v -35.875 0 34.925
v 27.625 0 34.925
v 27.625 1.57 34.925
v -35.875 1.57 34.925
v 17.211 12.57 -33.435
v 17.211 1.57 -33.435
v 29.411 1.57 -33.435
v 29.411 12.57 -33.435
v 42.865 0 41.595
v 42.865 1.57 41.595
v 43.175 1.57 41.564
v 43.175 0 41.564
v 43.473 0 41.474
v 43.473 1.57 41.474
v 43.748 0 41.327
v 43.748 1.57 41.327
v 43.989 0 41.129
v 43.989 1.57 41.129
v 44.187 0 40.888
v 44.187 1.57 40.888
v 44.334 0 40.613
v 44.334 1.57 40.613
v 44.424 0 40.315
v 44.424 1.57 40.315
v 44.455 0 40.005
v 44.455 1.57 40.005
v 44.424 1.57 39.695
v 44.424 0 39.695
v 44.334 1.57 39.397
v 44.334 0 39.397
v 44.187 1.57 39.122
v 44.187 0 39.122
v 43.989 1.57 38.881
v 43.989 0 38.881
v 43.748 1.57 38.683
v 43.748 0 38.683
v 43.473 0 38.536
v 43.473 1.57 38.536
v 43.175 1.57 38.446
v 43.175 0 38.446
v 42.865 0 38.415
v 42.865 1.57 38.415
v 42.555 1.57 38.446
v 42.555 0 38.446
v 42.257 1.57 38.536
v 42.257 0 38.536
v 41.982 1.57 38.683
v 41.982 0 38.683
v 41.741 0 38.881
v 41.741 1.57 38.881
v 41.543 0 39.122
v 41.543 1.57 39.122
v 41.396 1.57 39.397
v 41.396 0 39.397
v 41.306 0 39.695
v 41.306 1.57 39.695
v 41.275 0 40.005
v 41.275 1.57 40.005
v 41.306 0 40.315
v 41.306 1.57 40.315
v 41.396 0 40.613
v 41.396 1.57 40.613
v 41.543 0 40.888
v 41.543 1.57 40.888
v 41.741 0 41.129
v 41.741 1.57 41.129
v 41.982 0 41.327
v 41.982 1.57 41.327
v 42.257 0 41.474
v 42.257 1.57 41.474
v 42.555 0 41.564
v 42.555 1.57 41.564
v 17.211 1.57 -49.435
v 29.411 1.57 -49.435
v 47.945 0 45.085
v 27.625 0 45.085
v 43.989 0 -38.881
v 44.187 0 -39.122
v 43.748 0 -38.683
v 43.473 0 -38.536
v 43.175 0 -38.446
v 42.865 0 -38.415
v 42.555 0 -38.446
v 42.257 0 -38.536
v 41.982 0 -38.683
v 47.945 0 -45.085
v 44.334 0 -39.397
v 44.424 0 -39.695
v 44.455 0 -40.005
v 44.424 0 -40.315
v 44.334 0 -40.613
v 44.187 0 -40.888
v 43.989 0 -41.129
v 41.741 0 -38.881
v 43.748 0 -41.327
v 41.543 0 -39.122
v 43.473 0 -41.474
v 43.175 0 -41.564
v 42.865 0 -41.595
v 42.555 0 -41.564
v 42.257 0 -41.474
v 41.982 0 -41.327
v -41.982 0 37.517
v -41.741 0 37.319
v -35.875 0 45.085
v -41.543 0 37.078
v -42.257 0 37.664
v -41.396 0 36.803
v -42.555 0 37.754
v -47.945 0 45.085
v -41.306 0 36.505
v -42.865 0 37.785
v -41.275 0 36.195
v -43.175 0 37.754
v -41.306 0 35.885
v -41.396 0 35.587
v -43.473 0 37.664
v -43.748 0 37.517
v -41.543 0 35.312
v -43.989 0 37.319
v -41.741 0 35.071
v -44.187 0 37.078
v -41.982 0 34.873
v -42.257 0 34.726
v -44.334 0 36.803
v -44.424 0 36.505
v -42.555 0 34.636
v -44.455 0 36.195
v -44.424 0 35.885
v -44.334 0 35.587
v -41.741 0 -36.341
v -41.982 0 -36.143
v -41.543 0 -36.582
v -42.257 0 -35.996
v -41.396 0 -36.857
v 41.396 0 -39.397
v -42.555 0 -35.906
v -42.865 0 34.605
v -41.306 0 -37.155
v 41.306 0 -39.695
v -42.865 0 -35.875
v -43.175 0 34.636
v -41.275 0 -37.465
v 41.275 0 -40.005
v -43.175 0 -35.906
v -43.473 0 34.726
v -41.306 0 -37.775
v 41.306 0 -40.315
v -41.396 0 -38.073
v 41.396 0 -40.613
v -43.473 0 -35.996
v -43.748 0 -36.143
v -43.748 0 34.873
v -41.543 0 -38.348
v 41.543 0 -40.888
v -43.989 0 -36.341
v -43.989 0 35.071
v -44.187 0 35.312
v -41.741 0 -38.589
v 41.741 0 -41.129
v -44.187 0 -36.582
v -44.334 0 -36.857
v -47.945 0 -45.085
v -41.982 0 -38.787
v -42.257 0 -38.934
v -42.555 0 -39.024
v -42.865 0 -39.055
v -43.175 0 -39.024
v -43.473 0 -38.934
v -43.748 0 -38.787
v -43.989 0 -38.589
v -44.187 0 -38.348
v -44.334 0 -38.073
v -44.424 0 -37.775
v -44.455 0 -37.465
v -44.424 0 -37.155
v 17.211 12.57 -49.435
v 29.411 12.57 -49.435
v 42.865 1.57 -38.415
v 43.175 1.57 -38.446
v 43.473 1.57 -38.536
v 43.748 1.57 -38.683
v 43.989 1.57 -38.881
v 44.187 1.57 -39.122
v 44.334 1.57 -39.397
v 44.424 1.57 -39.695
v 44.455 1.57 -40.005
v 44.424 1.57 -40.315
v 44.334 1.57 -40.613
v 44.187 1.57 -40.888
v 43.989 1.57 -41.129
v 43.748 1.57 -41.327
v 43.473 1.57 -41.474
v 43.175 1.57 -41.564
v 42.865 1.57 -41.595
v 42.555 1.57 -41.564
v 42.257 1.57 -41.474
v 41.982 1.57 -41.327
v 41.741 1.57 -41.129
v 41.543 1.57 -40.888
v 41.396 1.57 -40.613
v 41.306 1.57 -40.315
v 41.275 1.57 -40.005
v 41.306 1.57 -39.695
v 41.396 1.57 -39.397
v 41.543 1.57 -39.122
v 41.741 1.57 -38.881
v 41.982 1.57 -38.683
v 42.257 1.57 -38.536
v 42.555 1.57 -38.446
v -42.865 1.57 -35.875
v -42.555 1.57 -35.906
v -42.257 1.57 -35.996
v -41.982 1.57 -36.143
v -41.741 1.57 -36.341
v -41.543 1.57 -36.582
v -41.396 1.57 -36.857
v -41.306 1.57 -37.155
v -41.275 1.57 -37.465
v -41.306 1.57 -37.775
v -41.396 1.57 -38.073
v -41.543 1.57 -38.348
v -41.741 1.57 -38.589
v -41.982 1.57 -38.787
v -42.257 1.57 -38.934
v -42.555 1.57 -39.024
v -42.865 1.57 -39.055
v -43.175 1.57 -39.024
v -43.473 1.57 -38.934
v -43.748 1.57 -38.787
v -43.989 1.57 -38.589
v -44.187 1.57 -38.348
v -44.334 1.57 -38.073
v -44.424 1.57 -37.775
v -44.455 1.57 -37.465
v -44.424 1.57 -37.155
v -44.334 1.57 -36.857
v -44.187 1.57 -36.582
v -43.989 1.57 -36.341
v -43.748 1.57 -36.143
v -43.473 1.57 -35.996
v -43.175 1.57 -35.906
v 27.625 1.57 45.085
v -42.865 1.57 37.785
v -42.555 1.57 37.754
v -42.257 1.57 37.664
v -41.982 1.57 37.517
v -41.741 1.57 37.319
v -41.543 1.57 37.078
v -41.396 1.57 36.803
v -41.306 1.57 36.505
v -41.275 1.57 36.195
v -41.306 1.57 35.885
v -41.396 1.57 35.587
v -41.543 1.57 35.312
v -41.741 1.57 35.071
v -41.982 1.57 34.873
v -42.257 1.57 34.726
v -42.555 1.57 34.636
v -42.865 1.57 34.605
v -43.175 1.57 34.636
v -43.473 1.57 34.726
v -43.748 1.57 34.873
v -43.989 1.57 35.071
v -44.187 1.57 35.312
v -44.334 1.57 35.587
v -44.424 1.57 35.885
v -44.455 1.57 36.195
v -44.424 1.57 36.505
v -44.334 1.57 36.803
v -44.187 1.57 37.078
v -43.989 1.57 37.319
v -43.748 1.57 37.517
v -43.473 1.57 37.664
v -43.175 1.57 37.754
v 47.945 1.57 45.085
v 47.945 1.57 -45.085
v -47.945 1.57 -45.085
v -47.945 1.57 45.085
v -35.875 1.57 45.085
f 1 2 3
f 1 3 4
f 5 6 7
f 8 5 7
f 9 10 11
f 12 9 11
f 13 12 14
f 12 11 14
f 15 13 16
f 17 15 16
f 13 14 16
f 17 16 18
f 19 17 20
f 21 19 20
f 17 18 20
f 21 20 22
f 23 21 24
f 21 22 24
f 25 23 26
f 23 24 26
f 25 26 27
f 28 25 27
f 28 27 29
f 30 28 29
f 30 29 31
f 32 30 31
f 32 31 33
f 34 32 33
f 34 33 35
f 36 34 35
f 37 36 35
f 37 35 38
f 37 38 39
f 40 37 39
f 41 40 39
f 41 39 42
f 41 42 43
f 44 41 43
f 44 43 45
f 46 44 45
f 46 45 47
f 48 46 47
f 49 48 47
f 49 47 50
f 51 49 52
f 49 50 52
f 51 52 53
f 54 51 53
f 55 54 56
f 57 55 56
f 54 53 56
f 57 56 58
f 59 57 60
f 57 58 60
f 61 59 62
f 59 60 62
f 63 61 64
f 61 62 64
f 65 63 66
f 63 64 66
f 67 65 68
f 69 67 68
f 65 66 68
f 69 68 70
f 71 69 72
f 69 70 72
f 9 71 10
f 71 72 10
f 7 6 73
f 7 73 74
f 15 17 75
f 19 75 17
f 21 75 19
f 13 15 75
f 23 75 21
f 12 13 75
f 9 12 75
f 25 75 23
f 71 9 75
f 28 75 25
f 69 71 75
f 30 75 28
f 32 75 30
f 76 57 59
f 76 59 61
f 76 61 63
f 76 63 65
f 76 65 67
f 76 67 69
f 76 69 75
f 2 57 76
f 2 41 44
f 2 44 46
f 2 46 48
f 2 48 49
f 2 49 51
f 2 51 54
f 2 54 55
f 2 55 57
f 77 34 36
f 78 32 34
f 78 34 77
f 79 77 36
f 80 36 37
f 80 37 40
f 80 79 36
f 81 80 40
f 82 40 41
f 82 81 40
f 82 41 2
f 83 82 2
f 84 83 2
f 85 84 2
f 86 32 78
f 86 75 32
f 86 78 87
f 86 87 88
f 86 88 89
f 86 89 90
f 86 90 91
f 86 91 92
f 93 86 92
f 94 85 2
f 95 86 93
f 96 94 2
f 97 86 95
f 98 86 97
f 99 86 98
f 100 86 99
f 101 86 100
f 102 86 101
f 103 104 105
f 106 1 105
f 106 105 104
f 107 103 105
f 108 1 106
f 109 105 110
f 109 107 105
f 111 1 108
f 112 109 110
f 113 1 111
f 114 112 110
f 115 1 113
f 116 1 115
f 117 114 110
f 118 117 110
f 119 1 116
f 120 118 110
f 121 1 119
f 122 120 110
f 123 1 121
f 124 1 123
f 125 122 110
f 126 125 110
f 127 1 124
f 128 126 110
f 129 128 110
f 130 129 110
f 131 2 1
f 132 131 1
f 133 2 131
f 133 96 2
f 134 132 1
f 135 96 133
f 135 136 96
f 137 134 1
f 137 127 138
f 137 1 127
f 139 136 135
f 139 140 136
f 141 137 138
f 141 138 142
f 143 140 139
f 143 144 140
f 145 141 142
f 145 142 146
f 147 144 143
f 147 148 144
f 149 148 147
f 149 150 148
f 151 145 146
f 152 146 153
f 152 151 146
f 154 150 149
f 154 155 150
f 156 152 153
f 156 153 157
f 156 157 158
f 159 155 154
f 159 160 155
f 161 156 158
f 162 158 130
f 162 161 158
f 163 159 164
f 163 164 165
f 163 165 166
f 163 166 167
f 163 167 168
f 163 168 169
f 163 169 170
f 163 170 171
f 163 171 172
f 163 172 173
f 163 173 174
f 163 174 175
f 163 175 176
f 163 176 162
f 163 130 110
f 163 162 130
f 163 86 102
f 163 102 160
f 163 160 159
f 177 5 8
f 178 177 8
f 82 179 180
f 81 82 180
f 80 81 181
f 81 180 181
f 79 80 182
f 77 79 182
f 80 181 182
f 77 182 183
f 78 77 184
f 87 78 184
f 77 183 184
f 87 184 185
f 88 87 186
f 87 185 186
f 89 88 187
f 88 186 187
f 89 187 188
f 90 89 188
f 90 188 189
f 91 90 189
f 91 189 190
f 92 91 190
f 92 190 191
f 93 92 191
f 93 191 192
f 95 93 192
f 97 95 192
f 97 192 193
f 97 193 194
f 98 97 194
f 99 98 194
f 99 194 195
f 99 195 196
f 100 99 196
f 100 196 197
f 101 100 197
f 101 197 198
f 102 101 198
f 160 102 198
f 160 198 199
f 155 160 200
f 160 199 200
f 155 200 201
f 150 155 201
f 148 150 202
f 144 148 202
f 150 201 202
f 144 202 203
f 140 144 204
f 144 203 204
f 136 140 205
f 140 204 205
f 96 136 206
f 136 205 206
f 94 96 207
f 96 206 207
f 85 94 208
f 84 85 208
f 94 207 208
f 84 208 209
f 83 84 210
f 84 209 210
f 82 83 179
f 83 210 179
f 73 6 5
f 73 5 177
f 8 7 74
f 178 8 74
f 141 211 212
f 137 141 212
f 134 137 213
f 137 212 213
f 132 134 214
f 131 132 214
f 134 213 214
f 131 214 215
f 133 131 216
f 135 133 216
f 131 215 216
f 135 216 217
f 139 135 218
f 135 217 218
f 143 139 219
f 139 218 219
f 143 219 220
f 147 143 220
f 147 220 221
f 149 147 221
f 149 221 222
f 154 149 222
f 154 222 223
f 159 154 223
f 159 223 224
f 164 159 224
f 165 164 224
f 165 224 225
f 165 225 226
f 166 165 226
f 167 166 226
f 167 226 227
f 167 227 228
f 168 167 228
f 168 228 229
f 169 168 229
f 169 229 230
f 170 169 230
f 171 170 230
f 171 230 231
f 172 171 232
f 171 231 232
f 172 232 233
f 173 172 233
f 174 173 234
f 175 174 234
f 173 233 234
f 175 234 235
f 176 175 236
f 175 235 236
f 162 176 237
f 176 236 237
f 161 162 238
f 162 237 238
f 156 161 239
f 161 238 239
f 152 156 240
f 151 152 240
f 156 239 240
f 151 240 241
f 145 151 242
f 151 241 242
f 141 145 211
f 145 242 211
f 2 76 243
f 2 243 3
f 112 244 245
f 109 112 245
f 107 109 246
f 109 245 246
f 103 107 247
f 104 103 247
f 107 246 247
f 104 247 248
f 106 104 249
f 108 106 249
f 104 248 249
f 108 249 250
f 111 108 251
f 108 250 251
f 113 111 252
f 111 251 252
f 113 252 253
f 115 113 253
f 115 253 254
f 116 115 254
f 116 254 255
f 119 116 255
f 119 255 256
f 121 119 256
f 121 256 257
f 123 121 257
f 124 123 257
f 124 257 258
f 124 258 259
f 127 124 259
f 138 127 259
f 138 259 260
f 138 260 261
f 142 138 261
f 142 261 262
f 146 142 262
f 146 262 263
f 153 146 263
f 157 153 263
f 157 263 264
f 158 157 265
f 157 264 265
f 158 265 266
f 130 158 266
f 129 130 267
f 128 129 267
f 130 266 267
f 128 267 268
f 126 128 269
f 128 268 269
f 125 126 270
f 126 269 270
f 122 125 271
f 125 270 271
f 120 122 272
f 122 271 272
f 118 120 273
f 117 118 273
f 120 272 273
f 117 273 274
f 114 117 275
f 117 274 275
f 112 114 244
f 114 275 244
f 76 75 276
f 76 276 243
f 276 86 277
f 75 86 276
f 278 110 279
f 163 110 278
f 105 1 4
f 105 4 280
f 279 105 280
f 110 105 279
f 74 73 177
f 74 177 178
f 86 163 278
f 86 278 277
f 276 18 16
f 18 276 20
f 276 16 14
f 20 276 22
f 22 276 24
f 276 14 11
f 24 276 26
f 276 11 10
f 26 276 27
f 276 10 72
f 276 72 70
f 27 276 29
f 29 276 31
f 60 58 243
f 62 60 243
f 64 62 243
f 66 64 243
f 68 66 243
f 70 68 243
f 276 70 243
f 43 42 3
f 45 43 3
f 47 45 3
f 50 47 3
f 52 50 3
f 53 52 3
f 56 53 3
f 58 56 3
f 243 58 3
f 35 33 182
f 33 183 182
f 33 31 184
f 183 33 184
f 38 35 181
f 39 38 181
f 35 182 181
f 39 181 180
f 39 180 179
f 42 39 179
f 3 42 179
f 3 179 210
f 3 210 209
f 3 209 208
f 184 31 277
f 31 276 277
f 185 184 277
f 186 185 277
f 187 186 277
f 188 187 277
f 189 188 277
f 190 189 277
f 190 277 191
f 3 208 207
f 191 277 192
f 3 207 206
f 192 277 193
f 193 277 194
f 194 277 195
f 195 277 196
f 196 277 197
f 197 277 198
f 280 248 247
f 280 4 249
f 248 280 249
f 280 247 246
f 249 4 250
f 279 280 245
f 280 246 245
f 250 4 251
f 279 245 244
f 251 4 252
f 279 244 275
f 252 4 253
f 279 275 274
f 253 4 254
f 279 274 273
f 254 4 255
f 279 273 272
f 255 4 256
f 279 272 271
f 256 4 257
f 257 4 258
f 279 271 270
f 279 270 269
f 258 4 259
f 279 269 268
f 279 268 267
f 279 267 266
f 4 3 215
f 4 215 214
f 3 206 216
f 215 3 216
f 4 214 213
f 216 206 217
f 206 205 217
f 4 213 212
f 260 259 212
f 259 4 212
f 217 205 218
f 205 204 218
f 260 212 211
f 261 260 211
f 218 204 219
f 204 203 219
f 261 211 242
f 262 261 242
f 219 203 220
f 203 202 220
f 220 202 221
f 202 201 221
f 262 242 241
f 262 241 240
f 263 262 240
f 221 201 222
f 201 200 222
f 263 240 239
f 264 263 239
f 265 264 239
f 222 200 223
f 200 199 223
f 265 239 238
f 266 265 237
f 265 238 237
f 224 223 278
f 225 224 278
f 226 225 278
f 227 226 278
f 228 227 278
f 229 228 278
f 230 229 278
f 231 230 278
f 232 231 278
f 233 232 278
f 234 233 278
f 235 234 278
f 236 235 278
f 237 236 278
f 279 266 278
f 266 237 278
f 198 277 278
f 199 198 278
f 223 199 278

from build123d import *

# Parameters (mm, degrees)
BOSS_EXTRUDE1_DEPTH = 1.57
SKETCH2_R           = 1.59
CUT_EXTRUDE1_DEPTH  = 66.831946272
SKETCH3_W           = 12.2
SKETCH3_H           = 16
BOSS_EXTRUDE2_DEPTH = 11


with BuildPart() as part:
    # Sketch1 → Boss-Extrude1 (new body)
    with BuildSketch(Plane(origin=(0, 0, 0), x_dir=(1, 0, 0), z_dir=(0, 1, 0))):
        Polygon((-35.875, -45.085), (-47.945, -45.085), (-47.945, 45.085), (47.945, 45.085), (47.945, -45.085), (27.625, -45.085), (27.625, -34.925), (-35.875, -34.925), align=None)
    extrude(amount=BOSS_EXTRUDE1_DEPTH)

    # Sketch2 → Cut-Extrude1 (cut, through all)
    with BuildSketch(Plane(origin=(0, 1.57, 0), x_dir=(1, 0, 0), z_dir=(0, 1, 0))):
        with Locations(Location((42.865, -40.005, 0), (0, 0, 270))):
            Circle(SKETCH2_R)
        with Locations(Location((-42.865, -36.195, 0), (0, 0, 270))):
            Circle(SKETCH2_R)
        with Locations(Location((-42.865, 37.465, 0), (0, 0, 270))):
            Circle(SKETCH2_R)
        with Locations(Location((42.865, 40.005, 0), (0, 0, 270))):
            Circle(SKETCH2_R)
    extrude(amount=-CUT_EXTRUDE1_DEPTH, mode=Mode.SUBTRACT)


with BuildPart() as body_2:
    # Sketch3 → Boss-Extrude2 (new body)
    with BuildSketch(Plane(origin=(0, 1.57, 0), x_dir=(1, 0, 0), z_dir=(0, 1, 0))):
        with Locations((23.311, 41.435)):
            Rectangle(SKETCH3_W, SKETCH3_H)
    extrude(amount=BOSS_EXTRUDE2_DEPTH)


solid = Compound([part.part, body_2.part])
